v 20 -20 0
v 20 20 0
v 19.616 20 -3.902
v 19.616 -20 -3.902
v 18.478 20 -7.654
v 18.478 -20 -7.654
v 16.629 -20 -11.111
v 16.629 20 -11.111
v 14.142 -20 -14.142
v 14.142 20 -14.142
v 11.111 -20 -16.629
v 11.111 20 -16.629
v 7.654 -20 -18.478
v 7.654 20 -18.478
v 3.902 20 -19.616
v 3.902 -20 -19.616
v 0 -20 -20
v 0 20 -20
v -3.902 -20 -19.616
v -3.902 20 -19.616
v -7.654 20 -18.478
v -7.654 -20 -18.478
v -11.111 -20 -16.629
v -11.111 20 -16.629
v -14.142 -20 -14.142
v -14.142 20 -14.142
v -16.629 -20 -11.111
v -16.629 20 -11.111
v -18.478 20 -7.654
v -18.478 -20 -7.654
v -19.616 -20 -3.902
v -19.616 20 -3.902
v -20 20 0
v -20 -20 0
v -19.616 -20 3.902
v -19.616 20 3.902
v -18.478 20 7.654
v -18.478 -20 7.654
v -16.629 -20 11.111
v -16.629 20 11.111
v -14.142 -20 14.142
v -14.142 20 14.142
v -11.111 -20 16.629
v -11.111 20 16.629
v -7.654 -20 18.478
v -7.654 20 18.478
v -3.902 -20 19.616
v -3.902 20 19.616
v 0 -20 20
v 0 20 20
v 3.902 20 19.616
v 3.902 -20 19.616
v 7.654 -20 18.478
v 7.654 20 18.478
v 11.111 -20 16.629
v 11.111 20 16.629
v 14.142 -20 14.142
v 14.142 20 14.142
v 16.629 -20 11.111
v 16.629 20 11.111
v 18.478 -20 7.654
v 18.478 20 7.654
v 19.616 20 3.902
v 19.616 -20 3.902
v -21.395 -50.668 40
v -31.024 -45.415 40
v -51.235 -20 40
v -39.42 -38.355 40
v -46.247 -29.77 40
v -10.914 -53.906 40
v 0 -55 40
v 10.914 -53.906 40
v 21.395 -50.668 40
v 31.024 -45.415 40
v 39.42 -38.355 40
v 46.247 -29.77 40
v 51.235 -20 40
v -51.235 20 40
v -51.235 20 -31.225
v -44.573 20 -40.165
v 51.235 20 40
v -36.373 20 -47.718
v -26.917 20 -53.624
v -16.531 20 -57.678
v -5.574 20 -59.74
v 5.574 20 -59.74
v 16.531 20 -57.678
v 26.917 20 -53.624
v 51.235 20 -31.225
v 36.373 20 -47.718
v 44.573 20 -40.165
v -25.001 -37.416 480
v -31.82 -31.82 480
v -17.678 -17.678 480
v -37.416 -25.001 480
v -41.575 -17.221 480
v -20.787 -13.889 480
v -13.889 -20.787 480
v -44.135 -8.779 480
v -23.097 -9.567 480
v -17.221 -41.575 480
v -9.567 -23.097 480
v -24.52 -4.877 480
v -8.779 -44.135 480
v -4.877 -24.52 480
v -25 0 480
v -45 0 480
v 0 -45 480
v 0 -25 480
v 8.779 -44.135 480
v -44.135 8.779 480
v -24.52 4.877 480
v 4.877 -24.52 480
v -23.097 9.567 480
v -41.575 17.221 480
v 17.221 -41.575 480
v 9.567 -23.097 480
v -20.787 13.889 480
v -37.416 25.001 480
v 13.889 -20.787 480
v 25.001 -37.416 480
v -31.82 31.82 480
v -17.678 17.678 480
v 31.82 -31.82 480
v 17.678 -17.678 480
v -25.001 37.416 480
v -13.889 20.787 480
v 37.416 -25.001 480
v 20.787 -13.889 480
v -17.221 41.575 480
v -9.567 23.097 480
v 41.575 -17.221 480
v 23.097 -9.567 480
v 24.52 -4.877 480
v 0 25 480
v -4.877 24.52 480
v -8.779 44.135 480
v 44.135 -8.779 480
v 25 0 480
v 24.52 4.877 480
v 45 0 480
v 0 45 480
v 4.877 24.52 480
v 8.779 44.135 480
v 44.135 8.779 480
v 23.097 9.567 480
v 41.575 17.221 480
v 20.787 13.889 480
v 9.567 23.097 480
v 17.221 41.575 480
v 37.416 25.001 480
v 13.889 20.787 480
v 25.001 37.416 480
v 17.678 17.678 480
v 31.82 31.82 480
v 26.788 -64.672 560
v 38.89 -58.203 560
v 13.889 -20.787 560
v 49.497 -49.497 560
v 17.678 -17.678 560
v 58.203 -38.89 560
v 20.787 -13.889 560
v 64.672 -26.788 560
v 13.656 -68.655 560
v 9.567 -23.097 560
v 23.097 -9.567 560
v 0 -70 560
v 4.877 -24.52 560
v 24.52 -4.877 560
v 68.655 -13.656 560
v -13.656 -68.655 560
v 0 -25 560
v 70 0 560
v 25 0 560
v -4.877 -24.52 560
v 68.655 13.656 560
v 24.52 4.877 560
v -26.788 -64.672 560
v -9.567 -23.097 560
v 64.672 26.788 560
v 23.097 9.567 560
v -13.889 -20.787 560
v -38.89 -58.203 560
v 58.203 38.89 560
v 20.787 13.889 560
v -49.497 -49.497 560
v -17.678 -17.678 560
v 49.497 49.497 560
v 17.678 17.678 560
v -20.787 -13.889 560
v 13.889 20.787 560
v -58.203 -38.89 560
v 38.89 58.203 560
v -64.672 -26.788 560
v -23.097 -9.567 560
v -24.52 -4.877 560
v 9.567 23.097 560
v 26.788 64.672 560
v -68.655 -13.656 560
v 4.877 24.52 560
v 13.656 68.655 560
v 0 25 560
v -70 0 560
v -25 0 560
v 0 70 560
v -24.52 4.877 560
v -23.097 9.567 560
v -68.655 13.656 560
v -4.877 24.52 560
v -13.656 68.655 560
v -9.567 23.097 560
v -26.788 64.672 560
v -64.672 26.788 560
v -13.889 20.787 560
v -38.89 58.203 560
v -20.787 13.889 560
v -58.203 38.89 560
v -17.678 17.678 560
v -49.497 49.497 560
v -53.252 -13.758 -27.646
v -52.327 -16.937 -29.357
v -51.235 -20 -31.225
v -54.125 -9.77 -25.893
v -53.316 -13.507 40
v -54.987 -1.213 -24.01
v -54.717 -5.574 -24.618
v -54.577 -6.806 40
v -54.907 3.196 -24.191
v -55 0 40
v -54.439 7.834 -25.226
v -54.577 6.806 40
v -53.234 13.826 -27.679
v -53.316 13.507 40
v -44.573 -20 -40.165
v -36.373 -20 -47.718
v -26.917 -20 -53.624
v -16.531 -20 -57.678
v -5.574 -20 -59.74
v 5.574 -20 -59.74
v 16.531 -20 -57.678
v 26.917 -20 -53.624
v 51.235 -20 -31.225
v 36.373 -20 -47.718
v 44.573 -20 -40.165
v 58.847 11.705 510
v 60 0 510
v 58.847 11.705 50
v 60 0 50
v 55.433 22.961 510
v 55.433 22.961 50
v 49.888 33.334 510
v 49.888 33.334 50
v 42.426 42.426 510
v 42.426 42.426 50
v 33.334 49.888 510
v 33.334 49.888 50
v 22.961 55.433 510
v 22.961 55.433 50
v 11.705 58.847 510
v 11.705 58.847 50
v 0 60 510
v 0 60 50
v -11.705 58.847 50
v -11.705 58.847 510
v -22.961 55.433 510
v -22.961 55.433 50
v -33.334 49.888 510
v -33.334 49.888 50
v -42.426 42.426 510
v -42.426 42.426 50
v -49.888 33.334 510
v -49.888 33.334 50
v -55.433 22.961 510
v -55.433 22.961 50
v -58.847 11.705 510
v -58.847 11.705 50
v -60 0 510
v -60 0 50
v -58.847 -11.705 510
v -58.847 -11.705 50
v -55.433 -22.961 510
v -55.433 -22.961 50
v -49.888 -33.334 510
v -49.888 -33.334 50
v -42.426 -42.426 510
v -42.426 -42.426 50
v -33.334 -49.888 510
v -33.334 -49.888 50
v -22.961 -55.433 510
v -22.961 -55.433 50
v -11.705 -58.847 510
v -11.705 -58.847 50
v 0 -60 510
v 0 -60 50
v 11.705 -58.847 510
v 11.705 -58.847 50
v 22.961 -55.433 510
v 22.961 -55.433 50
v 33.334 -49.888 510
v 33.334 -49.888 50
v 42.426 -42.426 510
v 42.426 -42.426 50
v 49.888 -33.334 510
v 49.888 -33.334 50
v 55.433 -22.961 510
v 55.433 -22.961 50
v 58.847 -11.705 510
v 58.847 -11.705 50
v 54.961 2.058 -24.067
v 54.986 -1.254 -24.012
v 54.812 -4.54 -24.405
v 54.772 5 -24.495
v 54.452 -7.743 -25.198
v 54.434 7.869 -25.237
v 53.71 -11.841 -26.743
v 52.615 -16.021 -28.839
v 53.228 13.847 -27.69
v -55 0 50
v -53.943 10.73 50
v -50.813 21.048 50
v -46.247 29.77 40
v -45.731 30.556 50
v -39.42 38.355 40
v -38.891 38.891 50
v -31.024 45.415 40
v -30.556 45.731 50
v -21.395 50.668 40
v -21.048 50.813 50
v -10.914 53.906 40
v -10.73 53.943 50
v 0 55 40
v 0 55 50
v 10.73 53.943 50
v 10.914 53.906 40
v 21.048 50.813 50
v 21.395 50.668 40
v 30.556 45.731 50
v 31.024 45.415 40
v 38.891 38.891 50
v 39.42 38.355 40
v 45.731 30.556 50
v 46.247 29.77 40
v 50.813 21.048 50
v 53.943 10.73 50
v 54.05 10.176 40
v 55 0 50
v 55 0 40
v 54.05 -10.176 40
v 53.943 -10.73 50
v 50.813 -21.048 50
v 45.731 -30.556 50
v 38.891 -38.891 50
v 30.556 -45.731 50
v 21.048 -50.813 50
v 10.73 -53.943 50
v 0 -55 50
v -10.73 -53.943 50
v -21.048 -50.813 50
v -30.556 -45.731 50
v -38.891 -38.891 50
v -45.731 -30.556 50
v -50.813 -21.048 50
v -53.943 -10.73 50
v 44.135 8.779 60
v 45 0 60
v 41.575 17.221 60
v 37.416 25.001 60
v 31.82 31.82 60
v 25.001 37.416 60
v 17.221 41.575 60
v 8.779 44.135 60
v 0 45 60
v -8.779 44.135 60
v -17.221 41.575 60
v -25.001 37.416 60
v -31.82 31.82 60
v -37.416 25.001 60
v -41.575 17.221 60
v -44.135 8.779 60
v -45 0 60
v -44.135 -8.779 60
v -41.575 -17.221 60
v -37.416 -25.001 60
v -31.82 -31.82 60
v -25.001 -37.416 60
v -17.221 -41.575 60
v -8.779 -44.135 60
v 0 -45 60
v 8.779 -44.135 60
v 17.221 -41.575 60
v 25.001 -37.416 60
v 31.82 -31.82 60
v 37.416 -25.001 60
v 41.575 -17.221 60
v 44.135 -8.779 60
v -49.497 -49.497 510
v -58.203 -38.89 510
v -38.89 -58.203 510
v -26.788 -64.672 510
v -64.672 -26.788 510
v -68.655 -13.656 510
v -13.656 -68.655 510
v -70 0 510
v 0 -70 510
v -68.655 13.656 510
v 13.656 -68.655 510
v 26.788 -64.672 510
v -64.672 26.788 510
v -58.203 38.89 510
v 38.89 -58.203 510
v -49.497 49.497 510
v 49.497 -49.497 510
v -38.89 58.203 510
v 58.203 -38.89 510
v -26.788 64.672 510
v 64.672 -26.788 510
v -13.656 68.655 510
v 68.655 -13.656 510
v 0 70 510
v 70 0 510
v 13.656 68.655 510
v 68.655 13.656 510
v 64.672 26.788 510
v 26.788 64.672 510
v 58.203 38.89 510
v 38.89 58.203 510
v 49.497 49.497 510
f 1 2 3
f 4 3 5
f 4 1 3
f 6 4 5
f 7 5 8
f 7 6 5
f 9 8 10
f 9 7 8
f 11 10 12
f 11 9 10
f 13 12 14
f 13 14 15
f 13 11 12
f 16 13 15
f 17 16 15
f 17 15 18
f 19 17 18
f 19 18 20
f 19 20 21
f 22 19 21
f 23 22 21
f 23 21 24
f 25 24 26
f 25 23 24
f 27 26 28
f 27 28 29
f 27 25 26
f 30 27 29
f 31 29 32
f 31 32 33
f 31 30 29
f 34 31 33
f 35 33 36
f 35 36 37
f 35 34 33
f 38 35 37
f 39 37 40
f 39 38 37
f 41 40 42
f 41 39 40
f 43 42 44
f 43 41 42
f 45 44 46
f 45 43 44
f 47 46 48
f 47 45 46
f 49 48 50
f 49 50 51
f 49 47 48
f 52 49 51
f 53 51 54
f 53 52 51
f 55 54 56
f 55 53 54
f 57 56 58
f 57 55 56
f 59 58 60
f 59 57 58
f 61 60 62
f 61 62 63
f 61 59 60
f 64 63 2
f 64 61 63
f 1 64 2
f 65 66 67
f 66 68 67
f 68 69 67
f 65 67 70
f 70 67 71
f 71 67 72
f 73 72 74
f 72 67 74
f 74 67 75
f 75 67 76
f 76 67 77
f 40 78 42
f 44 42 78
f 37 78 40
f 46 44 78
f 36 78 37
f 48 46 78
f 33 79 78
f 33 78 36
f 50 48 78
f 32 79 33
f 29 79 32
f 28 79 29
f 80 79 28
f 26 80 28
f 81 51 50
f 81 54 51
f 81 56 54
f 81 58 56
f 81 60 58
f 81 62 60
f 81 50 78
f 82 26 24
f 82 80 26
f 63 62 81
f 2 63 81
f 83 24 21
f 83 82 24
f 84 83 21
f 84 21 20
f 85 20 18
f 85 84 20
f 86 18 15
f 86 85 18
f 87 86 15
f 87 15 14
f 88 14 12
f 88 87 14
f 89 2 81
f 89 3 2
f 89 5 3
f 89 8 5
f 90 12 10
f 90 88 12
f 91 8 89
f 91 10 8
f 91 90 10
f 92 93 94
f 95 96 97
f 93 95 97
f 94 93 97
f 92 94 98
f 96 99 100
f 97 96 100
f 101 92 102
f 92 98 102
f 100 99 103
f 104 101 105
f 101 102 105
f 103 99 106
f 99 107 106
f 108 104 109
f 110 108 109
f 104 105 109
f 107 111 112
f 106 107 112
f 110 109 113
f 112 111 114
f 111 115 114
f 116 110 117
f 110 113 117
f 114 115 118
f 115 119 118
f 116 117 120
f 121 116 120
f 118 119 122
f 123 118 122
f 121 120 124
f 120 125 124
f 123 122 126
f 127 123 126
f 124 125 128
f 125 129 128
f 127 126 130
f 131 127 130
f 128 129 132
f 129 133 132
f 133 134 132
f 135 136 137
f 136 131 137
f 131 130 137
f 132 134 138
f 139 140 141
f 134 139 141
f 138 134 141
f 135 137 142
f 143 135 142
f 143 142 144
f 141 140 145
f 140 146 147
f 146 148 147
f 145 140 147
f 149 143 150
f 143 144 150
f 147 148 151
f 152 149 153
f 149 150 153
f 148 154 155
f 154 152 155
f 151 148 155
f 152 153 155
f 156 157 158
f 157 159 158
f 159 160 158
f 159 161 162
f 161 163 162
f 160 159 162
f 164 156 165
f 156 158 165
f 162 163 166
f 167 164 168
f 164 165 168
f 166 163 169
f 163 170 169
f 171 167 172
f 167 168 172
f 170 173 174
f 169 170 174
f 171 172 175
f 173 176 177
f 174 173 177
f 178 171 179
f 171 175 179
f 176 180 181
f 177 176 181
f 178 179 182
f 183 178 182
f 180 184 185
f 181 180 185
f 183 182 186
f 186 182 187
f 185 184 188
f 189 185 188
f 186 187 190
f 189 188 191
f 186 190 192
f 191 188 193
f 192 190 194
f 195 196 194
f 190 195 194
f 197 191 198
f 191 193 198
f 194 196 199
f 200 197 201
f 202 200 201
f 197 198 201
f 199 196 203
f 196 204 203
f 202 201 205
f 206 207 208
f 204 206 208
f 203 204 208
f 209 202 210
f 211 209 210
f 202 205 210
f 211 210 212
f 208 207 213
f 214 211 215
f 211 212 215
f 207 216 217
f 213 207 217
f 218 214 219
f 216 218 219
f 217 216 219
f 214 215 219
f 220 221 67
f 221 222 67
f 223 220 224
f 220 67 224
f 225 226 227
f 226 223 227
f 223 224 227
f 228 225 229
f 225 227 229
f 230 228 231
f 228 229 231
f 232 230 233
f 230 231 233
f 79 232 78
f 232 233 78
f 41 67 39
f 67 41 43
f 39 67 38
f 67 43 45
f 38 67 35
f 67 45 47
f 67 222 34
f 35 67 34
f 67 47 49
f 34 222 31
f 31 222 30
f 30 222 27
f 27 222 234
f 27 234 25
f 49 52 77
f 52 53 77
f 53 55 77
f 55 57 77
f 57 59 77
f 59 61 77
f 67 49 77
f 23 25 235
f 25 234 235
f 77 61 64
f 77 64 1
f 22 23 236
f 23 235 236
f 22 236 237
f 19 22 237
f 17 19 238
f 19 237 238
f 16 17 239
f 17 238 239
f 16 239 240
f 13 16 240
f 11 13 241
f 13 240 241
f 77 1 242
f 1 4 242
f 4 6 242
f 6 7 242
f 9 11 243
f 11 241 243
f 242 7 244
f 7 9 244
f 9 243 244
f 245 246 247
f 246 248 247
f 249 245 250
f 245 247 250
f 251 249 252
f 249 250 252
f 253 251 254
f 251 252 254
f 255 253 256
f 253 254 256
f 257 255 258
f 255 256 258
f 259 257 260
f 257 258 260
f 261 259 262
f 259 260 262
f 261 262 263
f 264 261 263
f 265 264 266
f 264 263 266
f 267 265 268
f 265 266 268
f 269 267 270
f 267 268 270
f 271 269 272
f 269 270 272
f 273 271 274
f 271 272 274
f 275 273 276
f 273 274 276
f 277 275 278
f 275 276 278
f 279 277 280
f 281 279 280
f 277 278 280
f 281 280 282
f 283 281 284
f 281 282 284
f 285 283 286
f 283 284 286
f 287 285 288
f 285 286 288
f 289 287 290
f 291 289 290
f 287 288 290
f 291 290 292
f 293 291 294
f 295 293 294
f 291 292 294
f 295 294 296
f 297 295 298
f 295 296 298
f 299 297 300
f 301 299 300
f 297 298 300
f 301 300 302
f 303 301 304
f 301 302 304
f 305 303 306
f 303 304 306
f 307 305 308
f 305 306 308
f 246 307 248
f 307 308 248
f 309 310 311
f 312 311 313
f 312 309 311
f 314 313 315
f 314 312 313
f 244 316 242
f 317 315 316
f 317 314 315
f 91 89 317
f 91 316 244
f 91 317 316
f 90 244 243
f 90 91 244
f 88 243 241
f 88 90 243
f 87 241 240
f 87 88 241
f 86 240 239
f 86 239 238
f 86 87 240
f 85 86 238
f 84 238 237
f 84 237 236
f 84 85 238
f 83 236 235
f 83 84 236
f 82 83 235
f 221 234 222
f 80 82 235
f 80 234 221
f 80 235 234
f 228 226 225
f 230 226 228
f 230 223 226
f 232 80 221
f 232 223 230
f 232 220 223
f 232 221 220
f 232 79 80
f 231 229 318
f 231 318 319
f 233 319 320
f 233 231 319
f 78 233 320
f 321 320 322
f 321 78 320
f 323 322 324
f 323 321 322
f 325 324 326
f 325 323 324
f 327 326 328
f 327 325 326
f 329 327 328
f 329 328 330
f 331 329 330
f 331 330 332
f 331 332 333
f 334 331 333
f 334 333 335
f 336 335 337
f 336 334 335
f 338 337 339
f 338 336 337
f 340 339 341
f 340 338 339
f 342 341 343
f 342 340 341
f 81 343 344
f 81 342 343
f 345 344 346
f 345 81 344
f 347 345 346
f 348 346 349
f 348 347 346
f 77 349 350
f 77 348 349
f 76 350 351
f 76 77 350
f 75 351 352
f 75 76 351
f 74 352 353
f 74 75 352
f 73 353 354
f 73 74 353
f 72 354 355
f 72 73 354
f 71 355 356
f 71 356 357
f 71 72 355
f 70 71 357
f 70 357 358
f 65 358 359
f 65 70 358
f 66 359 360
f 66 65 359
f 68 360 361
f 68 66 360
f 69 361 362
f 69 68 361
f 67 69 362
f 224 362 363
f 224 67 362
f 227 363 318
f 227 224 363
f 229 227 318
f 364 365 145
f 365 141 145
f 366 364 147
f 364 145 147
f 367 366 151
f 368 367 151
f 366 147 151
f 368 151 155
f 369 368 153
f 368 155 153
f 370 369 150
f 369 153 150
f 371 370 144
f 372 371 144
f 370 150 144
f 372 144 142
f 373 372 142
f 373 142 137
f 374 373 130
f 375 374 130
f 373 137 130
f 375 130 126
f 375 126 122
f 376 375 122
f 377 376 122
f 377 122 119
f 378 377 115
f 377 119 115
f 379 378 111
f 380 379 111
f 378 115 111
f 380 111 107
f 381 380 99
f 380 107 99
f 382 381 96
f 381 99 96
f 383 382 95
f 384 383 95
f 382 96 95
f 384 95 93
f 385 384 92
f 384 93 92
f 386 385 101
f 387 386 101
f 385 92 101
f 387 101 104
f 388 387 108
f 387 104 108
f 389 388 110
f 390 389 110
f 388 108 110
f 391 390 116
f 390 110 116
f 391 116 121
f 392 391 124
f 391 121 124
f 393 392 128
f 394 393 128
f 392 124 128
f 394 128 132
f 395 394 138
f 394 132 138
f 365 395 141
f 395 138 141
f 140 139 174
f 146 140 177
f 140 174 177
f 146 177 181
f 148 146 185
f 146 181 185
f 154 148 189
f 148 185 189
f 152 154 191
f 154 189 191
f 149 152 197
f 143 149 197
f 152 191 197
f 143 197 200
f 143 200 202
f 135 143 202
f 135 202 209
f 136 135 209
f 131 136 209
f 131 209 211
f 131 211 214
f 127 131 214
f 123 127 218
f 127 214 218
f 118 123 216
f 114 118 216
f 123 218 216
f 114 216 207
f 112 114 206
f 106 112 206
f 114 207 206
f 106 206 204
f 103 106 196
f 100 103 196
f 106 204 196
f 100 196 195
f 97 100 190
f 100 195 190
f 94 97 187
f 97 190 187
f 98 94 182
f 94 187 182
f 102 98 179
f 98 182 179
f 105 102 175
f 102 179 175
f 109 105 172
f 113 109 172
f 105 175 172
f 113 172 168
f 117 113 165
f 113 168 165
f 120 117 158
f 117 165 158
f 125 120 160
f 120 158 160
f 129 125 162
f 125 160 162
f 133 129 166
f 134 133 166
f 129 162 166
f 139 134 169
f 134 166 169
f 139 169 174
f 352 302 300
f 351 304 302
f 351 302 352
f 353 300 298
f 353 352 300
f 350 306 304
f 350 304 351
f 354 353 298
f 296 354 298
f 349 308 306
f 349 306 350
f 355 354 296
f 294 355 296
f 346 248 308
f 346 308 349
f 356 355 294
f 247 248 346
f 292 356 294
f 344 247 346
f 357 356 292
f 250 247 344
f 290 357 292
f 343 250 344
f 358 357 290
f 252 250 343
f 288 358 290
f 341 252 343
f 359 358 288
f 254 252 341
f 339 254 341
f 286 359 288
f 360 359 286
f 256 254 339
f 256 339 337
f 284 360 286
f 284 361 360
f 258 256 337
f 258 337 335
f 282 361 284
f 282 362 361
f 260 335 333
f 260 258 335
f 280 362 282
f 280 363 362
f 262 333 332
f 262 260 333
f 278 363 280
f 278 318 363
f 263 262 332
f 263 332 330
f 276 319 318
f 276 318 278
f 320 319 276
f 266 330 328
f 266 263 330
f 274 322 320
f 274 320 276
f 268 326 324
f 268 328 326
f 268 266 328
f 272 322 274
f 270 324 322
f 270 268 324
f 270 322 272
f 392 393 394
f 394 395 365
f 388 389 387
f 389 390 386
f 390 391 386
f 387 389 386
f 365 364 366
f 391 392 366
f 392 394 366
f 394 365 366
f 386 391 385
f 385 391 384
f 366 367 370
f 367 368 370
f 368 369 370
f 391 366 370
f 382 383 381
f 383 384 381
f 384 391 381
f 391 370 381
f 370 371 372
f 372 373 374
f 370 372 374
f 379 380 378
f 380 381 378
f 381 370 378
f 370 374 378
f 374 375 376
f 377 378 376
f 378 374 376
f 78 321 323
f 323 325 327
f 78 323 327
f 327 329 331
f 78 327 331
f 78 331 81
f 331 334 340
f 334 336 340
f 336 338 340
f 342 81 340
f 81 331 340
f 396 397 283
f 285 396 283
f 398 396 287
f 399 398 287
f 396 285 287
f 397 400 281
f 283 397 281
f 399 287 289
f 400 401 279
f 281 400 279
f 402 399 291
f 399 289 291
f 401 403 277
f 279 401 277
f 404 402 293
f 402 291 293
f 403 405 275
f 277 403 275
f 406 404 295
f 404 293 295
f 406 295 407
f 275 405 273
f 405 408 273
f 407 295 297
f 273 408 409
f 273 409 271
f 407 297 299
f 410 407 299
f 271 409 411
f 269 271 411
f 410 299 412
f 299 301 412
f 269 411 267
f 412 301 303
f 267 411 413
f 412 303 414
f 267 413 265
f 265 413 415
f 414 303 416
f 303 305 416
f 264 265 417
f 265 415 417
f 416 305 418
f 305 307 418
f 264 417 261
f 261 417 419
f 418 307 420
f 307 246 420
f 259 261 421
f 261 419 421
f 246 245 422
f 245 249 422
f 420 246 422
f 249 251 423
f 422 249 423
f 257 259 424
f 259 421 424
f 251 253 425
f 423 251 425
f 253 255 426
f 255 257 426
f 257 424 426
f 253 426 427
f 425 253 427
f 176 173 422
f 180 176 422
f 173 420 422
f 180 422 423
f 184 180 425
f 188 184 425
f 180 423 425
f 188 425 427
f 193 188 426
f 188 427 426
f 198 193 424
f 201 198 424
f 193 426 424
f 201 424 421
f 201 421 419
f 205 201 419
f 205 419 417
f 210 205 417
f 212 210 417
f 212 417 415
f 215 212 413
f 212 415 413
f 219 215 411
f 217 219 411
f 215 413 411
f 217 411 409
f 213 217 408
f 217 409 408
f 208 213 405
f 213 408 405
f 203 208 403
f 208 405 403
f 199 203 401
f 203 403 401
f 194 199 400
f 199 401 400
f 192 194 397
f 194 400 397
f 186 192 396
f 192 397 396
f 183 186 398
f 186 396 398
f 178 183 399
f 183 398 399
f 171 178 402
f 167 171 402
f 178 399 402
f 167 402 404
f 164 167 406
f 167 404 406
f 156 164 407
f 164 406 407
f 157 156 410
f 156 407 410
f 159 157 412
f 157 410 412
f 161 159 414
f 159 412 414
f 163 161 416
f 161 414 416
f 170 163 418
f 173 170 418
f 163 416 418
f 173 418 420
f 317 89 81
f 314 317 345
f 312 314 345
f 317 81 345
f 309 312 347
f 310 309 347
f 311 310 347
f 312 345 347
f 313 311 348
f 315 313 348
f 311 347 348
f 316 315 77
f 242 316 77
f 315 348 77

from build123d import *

# Parameters (mm, degrees)
SKETCH2_R               = 20
BOSS_EXTRUDE1_DEPTH     = 20
SKETCH3_R               = 63.245553203
SKETCH3_R_2             = 55
CUT_EXTRUDE1_DEPTH      = 101
CUT_EXTRUDE1_DEPTH_BACK = 10


with BuildPart() as part:
    # Sketch1 → Revolve1 (revolve)
    with BuildSketch(Plane(origin=(0, 0, 0), x_dir=(1, 0, 0), z_dir=(0, 1, 0))):
        Polygon((70, -560), (70, -510), (60, -510), (60, -40), (0, -40), (0, -60), (45, -60), (45, -480), (25, -480), (25, -560), align=None)
    revolve(axis=Axis((0, 0, 0), (0, 0, 1)))

    # Sketch2 → Boss-Extrude1 (add, symmetric)
    with BuildSketch(Plane(origin=(0, 0, 0), x_dir=(1, 0, 0), z_dir=(0, 1, 0))):
        with BuildLine():
            Line((60, -40), (60, 0))
            ThreePointArc((60, 0), (0, 60), (-60, 0))
            Line((-60, 0), (-60, -40))
            Line((-60, -40), (60, -40))
        make_face()
        Circle(SKETCH2_R, mode=Mode.SUBTRACT)
    extrude(amount=BOSS_EXTRUDE1_DEPTH, both=True)

    # Sketch3 → Cut-Extrude1 (cut, two sides)
    with BuildSketch(Plane(origin=(0, 0, 40), x_dir=(-1, 0, 0), z_dir=(0, 0, -1))) as cut_extrude1_sk:
        Circle(SKETCH3_R)
        Circle(SKETCH3_R_2, mode=Mode.SUBTRACT)
    extrude(amount=CUT_EXTRUDE1_DEPTH, mode=Mode.SUBTRACT)
    extrude(cut_extrude1_sk.sketch, amount=-CUT_EXTRUDE1_DEPTH_BACK, mode=Mode.SUBTRACT)


solid = part.part
